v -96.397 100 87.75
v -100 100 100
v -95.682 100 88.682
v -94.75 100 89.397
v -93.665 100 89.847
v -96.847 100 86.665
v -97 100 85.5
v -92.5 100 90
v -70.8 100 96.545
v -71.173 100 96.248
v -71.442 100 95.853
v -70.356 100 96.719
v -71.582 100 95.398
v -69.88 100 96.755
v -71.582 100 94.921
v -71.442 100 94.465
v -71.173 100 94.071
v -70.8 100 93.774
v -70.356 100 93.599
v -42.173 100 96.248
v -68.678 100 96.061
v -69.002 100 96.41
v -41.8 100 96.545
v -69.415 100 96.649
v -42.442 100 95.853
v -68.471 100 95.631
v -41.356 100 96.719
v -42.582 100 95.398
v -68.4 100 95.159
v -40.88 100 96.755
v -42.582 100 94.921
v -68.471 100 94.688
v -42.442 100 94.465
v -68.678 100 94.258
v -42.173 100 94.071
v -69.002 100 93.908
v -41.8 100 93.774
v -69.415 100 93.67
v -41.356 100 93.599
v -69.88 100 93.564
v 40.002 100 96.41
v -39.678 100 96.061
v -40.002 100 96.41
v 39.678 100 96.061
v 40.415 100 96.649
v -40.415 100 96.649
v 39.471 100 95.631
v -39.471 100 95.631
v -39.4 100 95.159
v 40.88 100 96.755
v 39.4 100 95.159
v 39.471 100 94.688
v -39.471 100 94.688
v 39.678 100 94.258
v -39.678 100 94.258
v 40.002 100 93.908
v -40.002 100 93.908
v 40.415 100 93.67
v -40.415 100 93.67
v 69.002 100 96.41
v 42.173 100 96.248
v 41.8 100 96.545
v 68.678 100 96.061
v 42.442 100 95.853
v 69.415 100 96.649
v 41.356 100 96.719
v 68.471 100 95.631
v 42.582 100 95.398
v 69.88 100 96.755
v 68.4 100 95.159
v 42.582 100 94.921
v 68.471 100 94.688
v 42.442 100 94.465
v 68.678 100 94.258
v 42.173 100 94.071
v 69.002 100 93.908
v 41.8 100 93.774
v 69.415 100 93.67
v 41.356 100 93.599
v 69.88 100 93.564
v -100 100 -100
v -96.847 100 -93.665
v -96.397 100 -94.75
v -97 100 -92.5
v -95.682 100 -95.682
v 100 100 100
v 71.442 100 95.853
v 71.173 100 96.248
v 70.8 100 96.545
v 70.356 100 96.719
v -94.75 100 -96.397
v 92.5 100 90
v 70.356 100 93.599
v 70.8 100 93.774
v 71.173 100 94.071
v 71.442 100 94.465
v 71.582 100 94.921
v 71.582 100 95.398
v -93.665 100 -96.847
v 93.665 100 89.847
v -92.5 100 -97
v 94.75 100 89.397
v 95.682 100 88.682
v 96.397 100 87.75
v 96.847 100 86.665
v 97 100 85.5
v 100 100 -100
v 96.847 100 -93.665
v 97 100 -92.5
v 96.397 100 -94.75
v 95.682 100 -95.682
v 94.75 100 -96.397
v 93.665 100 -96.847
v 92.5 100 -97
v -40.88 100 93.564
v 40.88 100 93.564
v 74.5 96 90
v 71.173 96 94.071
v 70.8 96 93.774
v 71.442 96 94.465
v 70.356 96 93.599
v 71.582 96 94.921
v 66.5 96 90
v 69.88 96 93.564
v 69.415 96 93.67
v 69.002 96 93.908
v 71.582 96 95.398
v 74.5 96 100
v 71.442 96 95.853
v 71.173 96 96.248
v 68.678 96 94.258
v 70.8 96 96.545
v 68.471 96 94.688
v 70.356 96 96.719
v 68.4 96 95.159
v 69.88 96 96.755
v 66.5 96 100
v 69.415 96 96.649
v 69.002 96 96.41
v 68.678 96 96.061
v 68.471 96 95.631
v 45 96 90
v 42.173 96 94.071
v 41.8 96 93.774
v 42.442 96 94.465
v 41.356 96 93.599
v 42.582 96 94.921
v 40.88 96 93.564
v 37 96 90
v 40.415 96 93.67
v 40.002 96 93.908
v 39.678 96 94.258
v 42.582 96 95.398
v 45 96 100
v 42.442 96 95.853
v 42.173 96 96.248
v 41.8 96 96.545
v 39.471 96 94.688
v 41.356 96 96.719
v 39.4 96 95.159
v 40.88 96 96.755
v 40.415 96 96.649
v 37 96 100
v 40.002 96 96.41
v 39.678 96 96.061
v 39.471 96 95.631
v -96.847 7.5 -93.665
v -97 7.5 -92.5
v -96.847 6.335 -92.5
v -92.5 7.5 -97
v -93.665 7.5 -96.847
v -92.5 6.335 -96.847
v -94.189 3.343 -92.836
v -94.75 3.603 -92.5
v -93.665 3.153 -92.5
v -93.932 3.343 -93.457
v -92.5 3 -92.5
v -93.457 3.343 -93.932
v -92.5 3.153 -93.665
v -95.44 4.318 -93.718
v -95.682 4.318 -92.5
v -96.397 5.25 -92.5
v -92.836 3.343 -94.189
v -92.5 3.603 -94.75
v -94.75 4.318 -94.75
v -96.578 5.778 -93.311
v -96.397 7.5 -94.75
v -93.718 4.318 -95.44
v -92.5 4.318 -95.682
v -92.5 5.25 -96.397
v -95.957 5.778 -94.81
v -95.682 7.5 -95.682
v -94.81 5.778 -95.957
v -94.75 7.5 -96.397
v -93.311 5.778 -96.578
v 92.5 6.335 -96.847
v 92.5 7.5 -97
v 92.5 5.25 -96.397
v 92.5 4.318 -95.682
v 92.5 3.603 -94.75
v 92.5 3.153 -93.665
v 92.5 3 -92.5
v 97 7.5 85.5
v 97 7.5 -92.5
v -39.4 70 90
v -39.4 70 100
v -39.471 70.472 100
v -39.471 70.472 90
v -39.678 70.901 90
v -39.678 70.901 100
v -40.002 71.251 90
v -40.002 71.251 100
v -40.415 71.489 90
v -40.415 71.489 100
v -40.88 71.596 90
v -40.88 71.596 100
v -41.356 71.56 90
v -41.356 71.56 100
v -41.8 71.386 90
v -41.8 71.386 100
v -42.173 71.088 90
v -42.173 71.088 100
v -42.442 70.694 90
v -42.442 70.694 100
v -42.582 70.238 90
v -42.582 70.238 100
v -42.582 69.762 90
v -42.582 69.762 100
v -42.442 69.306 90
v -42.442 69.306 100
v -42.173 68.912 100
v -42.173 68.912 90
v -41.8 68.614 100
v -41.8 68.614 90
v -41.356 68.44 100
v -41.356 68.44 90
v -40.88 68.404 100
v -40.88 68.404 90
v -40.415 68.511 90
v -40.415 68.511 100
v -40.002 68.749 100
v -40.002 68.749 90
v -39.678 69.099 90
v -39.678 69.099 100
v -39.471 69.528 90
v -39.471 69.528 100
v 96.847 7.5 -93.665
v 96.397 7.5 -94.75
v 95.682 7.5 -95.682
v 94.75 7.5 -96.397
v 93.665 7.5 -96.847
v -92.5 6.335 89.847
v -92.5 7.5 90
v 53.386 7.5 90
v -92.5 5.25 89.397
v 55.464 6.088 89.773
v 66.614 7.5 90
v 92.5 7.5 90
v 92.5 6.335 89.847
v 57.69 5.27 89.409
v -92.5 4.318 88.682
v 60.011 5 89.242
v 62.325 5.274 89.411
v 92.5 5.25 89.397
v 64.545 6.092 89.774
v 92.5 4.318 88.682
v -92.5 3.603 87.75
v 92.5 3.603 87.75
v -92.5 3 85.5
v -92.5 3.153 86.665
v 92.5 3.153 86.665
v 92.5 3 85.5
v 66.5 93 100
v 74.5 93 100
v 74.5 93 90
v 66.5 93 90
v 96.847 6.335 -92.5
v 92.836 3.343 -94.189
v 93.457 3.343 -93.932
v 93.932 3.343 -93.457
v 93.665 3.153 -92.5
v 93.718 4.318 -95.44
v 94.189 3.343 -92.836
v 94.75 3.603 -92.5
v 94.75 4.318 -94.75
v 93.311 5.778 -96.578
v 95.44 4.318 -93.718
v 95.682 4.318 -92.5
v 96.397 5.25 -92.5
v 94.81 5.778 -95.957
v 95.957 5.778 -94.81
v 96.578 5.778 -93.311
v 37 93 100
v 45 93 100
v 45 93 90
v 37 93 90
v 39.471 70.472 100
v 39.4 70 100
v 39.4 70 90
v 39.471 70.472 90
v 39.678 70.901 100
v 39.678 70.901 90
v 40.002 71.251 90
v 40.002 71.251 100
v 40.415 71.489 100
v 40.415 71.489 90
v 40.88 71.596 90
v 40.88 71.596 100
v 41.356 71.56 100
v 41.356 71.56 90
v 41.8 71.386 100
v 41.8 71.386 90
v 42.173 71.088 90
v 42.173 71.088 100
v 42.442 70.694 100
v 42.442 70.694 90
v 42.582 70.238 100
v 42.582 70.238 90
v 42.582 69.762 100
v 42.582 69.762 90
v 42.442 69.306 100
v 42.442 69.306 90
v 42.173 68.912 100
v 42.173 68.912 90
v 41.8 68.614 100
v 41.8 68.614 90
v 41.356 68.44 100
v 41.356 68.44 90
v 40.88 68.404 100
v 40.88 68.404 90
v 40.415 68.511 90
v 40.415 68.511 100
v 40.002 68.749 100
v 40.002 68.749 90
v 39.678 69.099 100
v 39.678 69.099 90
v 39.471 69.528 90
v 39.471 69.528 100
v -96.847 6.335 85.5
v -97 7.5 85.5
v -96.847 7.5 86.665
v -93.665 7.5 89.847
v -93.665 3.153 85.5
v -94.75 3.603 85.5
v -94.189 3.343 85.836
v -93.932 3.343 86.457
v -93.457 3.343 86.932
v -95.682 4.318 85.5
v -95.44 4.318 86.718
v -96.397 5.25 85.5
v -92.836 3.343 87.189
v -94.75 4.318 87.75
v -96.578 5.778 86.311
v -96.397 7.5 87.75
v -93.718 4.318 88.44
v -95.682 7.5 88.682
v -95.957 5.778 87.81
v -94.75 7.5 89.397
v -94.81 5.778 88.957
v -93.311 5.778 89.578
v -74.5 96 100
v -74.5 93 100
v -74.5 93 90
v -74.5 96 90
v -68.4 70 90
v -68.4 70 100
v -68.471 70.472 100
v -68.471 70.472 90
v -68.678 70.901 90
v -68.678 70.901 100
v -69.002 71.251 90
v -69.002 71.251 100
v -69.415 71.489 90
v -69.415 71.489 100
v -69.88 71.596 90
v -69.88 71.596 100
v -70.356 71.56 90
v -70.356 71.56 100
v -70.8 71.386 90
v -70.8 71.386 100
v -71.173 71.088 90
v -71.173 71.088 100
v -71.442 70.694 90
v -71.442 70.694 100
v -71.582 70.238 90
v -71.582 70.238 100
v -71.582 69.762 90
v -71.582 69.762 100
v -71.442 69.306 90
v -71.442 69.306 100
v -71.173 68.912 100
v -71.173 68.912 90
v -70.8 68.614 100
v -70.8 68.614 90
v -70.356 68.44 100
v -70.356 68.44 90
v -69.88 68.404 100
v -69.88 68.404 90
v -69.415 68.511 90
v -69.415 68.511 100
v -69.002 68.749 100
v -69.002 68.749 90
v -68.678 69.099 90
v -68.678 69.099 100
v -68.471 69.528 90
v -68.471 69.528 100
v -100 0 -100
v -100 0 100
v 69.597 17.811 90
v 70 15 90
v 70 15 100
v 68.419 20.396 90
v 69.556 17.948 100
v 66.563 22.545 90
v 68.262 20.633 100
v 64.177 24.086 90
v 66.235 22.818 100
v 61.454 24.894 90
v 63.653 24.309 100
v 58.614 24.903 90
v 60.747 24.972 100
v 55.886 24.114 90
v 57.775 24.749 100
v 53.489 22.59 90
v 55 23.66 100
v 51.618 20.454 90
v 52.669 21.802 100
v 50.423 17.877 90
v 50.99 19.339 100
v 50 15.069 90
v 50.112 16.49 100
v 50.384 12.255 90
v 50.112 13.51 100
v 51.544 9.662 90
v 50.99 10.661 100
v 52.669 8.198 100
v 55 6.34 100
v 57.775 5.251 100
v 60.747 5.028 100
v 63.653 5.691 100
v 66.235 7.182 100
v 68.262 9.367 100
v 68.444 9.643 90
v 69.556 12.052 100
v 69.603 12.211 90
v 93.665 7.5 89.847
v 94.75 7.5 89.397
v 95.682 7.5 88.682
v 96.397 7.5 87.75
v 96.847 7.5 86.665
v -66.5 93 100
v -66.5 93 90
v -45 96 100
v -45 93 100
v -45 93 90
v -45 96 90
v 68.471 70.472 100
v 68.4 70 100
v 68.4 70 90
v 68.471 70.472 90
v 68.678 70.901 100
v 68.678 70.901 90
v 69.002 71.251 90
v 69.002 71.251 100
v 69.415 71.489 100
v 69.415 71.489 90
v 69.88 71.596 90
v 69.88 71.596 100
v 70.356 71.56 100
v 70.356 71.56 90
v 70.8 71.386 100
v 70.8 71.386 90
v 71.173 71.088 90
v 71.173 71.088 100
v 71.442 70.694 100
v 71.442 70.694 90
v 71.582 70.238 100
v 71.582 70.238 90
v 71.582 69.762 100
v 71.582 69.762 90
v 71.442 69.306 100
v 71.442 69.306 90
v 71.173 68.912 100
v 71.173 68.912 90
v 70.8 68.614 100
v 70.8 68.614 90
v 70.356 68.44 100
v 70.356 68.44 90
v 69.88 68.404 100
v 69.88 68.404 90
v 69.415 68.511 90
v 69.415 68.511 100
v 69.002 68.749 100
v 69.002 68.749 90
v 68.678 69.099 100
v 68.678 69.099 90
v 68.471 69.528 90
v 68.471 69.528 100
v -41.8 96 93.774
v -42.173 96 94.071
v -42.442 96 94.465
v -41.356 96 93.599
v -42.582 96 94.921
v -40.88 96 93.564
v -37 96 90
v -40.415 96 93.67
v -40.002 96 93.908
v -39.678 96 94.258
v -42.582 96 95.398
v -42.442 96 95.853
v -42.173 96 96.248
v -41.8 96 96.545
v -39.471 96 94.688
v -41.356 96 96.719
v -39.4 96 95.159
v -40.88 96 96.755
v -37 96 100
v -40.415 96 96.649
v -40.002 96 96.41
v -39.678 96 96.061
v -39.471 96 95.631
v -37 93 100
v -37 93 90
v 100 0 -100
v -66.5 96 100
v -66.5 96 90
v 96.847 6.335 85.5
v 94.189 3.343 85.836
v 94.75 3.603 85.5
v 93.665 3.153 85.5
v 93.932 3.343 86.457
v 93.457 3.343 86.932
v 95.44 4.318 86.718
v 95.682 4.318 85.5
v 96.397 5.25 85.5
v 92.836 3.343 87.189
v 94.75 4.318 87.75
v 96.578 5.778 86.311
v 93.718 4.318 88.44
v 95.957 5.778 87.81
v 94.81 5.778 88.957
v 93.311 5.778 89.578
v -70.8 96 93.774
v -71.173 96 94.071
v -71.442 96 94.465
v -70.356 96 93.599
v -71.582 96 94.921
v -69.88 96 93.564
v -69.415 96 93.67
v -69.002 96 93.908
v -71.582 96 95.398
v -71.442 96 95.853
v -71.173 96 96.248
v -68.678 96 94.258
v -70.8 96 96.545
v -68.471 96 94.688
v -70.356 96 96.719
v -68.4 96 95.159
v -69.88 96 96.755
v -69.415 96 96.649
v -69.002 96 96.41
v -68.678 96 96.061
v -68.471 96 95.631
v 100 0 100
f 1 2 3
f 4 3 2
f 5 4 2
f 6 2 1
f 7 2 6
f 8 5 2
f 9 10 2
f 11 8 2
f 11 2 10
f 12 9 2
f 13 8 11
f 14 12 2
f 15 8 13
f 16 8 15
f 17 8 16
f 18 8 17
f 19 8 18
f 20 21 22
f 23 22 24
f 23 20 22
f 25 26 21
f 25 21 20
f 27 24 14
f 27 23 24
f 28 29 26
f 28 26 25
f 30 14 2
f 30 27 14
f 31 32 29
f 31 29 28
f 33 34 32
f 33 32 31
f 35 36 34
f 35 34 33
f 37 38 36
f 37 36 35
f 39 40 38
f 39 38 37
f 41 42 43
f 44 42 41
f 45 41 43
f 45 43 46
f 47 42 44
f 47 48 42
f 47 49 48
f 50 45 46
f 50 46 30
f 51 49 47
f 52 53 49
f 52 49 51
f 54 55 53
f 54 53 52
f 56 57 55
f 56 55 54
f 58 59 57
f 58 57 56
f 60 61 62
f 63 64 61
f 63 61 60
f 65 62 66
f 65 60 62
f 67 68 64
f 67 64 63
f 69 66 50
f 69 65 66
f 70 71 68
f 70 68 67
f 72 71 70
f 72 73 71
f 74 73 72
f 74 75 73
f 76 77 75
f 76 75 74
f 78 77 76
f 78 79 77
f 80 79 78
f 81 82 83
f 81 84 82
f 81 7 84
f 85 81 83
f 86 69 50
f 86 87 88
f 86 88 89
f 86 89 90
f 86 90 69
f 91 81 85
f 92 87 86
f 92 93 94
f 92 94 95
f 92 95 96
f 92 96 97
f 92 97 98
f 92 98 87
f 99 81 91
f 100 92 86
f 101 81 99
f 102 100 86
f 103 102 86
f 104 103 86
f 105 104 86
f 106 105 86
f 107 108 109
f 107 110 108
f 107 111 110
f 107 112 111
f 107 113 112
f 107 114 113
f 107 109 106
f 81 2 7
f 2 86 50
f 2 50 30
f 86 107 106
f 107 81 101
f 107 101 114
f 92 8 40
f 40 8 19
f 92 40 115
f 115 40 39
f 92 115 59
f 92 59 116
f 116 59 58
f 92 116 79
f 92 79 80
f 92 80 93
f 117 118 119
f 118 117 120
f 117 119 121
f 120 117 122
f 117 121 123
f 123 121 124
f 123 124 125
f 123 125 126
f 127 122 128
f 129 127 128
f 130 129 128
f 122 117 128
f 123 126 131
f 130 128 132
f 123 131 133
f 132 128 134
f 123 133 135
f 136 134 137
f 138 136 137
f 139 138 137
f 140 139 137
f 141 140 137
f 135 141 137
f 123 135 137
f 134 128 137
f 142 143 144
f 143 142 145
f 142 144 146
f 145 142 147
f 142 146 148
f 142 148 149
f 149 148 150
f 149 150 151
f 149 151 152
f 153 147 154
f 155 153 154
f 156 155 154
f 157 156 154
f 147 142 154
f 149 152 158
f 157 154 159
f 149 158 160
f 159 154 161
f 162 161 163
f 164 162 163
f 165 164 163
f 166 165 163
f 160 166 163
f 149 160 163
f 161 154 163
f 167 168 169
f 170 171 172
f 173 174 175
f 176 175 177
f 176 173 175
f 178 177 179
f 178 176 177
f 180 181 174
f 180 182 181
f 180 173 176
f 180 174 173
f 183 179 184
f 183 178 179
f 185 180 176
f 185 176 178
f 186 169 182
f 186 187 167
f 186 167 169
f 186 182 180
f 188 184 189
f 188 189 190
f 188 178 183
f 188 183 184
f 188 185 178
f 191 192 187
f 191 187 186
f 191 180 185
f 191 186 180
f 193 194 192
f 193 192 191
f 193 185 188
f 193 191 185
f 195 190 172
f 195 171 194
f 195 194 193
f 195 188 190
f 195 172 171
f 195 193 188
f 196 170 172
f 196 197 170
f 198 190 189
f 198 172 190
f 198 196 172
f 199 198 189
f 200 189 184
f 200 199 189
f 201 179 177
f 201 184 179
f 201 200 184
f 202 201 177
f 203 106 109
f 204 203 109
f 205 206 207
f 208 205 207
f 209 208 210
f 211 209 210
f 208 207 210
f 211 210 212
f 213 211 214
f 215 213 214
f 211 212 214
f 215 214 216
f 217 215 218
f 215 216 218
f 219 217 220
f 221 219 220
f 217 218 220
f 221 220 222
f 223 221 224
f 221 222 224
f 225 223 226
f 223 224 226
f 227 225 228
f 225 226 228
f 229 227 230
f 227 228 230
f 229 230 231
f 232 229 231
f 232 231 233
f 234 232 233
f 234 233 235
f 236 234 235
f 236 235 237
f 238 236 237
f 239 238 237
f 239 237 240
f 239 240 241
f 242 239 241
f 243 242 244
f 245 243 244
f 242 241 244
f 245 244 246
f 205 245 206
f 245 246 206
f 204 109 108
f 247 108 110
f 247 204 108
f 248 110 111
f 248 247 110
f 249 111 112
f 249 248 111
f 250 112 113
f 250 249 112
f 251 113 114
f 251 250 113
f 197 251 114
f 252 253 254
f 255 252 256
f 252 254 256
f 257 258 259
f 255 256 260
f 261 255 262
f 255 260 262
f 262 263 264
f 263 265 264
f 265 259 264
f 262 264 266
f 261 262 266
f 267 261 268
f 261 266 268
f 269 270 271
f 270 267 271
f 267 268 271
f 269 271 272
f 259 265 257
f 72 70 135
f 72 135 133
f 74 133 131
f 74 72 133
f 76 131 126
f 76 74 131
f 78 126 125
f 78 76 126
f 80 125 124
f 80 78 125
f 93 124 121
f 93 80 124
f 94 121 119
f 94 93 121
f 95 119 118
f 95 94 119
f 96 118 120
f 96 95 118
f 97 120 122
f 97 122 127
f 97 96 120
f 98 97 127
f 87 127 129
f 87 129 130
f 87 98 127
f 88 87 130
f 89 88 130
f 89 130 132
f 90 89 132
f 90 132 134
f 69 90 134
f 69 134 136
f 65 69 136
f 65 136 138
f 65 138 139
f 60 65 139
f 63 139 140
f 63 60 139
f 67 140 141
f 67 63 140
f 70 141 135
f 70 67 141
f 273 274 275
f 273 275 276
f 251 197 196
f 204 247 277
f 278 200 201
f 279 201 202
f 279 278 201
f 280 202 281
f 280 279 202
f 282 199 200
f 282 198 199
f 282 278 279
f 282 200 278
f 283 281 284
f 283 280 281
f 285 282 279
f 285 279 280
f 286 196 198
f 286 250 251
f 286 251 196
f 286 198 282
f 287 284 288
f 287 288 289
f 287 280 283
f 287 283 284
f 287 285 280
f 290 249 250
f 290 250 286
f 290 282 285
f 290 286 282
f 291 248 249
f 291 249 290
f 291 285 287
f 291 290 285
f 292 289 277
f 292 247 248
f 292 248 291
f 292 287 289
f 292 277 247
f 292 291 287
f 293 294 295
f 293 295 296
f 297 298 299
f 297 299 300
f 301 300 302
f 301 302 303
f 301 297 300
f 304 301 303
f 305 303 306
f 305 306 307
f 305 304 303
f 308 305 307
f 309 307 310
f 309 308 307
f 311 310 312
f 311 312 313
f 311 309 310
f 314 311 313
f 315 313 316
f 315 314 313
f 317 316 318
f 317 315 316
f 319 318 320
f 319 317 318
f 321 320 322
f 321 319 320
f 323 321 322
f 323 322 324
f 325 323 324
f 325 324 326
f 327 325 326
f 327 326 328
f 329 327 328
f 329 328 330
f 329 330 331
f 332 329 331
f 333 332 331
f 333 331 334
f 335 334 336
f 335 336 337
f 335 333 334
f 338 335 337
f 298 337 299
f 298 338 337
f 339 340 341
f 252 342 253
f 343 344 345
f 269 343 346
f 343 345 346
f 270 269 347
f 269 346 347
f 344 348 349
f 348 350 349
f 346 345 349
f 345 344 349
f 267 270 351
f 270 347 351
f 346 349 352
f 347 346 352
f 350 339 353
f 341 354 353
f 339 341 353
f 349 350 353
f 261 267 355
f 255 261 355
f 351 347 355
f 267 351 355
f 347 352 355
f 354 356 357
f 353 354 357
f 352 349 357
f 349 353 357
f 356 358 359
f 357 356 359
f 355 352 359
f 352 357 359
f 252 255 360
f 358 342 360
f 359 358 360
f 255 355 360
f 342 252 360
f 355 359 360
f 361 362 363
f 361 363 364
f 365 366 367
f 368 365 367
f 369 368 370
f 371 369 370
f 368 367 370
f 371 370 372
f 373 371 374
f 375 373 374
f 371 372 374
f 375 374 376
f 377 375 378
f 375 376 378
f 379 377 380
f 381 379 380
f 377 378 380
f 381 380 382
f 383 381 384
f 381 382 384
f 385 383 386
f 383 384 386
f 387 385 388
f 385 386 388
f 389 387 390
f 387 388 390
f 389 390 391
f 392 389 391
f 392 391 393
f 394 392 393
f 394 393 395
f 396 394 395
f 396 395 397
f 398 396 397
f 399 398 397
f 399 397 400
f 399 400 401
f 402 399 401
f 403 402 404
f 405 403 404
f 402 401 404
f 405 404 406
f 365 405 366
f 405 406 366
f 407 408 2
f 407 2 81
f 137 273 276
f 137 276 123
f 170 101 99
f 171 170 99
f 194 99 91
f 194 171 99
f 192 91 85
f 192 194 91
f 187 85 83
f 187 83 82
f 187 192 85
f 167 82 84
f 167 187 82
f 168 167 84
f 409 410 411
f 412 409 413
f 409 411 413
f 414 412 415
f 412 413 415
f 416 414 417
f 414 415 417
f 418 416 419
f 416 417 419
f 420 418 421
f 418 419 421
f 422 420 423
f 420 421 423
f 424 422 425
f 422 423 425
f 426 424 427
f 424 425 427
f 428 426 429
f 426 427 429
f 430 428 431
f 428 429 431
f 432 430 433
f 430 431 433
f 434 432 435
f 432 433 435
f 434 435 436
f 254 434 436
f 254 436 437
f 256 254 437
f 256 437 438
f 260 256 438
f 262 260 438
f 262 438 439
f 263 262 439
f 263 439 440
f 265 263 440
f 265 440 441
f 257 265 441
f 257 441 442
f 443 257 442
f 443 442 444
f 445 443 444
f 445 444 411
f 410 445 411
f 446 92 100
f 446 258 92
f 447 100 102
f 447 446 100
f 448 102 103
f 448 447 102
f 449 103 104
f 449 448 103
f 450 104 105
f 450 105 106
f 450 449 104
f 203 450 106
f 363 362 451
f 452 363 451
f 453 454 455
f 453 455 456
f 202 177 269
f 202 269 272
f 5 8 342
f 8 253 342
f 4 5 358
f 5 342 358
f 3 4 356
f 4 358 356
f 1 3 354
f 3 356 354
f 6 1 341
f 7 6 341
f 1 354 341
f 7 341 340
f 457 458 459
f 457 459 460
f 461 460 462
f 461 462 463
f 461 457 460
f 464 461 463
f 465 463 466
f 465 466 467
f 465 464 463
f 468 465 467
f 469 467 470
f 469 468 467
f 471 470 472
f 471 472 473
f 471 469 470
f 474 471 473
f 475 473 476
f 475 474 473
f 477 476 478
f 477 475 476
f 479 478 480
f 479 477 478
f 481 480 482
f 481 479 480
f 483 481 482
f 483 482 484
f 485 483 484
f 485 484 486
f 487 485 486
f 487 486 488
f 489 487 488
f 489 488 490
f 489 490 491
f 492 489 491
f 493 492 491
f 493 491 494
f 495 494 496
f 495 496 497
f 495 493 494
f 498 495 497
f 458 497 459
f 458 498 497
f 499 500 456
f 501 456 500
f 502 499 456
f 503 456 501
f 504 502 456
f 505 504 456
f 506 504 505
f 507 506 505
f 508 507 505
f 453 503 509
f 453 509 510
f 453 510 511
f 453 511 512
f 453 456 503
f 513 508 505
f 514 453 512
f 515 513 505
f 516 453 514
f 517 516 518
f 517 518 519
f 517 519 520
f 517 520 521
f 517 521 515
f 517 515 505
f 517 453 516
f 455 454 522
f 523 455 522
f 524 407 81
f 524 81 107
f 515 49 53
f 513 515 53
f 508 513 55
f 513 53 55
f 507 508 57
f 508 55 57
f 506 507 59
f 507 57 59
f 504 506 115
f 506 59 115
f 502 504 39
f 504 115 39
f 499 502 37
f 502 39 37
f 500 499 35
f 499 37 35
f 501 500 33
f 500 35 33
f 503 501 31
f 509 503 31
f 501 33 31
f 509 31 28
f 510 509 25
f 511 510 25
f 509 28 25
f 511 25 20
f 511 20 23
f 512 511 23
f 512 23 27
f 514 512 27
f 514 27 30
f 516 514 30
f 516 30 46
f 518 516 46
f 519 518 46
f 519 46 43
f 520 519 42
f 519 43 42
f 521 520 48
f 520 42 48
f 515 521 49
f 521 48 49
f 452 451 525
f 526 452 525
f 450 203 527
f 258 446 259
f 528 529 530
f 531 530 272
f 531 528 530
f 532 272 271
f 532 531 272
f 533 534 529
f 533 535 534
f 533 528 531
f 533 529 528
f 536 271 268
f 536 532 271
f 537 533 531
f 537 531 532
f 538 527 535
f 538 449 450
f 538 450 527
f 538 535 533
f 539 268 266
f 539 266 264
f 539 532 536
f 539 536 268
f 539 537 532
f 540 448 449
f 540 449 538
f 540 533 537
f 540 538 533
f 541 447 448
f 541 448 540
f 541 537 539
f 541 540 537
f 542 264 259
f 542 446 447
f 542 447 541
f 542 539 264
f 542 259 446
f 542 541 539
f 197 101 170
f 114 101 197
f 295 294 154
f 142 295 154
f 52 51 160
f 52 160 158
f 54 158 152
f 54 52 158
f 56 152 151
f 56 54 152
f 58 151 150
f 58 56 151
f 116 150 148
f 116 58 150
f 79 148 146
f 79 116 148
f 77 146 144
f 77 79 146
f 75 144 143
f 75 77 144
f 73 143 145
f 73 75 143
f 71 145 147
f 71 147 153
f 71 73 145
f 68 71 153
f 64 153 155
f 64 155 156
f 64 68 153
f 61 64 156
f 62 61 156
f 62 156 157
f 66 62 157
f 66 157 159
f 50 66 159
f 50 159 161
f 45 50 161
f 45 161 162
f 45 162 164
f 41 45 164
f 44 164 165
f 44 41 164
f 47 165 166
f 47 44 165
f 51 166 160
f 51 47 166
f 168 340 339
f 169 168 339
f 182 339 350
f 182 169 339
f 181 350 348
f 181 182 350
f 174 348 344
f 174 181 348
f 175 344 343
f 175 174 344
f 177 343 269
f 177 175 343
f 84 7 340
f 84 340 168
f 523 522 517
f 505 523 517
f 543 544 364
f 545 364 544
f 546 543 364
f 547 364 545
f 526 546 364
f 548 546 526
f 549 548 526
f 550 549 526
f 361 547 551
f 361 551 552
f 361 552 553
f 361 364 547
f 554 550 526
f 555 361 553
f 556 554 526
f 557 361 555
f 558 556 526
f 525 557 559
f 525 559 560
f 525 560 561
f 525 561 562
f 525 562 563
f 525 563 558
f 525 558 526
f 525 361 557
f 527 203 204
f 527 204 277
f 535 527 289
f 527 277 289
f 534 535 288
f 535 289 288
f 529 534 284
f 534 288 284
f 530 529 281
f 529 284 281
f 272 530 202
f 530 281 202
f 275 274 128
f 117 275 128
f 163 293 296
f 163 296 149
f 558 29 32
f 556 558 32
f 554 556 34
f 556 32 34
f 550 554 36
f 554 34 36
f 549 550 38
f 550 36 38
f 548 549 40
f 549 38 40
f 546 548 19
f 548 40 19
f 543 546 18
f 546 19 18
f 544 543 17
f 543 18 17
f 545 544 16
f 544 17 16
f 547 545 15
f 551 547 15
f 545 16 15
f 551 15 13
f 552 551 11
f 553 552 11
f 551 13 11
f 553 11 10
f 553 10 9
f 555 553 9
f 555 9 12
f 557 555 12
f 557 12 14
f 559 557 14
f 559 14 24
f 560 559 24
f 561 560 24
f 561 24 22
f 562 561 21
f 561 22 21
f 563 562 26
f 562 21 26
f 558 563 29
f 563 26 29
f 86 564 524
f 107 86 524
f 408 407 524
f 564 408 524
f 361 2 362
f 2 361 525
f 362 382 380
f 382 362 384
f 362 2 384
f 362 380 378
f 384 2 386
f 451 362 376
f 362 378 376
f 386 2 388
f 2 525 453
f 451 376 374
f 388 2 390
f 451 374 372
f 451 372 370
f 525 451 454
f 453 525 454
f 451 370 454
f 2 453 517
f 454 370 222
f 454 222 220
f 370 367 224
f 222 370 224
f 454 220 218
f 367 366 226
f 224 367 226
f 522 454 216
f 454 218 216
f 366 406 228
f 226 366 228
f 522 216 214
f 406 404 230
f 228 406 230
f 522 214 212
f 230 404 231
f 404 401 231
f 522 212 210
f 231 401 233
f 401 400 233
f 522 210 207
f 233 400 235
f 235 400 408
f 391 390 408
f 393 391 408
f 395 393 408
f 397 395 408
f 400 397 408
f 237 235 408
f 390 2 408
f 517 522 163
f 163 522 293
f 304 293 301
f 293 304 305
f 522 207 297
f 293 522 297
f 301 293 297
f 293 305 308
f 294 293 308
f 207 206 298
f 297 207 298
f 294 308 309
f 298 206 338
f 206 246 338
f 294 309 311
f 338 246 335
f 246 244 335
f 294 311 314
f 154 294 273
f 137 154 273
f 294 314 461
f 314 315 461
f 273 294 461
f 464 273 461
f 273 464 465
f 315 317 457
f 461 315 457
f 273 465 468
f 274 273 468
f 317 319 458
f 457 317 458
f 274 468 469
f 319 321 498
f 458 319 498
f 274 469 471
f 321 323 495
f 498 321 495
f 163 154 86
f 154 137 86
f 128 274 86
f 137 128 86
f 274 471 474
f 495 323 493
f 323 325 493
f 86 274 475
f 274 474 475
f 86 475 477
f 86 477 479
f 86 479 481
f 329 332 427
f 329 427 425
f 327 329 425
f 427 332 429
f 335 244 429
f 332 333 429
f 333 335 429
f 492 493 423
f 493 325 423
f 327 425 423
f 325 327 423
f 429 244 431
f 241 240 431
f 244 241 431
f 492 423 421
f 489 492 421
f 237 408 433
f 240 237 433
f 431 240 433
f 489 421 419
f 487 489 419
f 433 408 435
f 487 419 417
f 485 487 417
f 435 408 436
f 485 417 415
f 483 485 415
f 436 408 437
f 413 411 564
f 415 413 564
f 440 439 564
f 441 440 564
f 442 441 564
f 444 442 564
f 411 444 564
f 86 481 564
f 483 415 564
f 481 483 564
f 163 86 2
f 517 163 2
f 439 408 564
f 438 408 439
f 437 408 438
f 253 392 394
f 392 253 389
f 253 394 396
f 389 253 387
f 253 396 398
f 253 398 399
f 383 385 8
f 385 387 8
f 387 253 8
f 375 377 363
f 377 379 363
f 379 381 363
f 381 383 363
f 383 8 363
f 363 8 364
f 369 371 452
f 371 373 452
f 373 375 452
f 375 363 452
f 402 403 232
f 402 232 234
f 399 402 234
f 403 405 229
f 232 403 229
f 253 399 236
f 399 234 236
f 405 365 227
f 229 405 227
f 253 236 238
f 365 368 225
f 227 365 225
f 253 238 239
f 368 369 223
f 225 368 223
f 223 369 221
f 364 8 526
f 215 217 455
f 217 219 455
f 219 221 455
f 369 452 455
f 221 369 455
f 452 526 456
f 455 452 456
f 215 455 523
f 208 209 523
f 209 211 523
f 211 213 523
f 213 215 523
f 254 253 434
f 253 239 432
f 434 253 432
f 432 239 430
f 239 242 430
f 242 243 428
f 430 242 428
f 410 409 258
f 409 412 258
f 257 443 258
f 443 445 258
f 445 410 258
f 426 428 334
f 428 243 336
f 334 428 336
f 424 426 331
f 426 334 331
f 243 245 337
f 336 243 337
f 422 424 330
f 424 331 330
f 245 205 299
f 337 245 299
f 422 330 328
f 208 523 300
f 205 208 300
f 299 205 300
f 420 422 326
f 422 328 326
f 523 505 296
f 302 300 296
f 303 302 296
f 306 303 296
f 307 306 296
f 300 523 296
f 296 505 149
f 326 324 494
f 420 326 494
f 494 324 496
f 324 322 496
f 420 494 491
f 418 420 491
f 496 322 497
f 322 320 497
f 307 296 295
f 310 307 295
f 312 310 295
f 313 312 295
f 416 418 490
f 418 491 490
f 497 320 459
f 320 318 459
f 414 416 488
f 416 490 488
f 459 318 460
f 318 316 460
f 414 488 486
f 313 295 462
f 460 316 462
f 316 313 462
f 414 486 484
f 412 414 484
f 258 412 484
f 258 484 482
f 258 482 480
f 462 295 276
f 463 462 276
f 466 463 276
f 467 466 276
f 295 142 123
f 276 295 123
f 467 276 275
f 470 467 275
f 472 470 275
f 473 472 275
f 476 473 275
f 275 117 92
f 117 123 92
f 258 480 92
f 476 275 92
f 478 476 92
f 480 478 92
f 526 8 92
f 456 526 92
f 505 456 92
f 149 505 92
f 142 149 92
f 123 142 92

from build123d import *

# Parameters (mm, degrees)
CROQUIS1_W              = 200
CROQUIS1_H              = 200
SALIENTE_EXTRUIR1_DEPTH = 100
CROQUIS2_W              = 194
CROQUIS2_H              = 187
CORTAR_EXTRUIR1_DEPTH   = 97
REDONDEO2_R             = 4.5
CROQUIS3_R              = 1.6
CROQUIS3_W              = 8
CROQUIS3_H              = 3
CORTAR_EXTRUIR2_DEPTH   = 10
CORTAR_EXTRUIR3_REACH   = 202
CROQUIS4_R              = 10
CROQUIS5_R              = 1.6
CORTAR_EXTRUIR4_DEPTH   = 4


with BuildPart() as part:
    # Croquis1 → Saliente-Extruir1 (new body)
    with BuildSketch(Plane(origin=(0, 0, 0), x_dir=(1, 0, 0), z_dir=(0, 1, 0))):
        Rectangle(CROQUIS1_W, CROQUIS1_H)
    extrude(amount=SALIENTE_EXTRUIR1_DEPTH)

    # Croquis2 → Cortar-Extruir1 (cut)
    with BuildSketch(Plane(origin=(0, 100, 0), x_dir=(1, 0, 0), z_dir=(0, 1, 0))):
        with Locations((0, 3.5)):
            Rectangle(CROQUIS2_W, CROQUIS2_H)
    extrude(amount=-CORTAR_EXTRUIR1_DEPTH, mode=Mode.SUBTRACT)

    # Redondeo2
    redondeo2_edges = [part.edges().sort_by_distance(p)[0] for p in [
        (-97, 51.5, 90),
        (-97, 51.5, -97),
        (97, 51.5, -97),
        (97, 51.5, 90),
        (-97, 3, -3.5),
        (0, 3, -97),
        (97, 3, -3.5),
        (0, 3, 90),
    ]]
    fillet(redondeo2_edges, radius=REDONDEO2_R)

    # Croquis3 → Cortar-Extruir2 (cut)
    with BuildSketch(Plane.XY.offset(100)):
        with Locations((-70, 70)):
            Circle(CROQUIS3_R)
        with Locations((-41, 70)):
            Circle(CROQUIS3_R)
        with Locations((-70.5, 94.5)):
            Rectangle(CROQUIS3_W, CROQUIS3_H)
        with Locations((-41, 94.5)):
            Rectangle(CROQUIS3_W, CROQUIS3_H)
    cortar_extruir2 = extrude(amount=-CORTAR_EXTRUIR2_DEPTH, mode=Mode.SUBTRACT)

    # Simetría1: Cortar-Extruir2 across plane
    add(cortar_extruir2.mirror(Plane(origin=(0, 0, 0), x_dir=(0, 0, 1), z_dir=(1, 0, 0))), mode=Mode.SUBTRACT)

    # Croquis4 → Cortar-Extruir3 (cut, up to next)
    with BuildSketch(Plane.XY.offset(100), mode=Mode.PRIVATE) as cortar_extruir3_sk1:
        with Locations((60, 15)):
            Circle(CROQUIS4_R)
    cortar_extruir3_tool1 = extrude(cortar_extruir3_sk1.sketch, amount=-CORTAR_EXTRUIR3_REACH, mode=Mode.PRIVATE) & part.part
    add(cortar_extruir3_tool1.solids().sort_by_distance((60, 15, 100))[0], mode=Mode.SUBTRACT)

    # Croquis5 → Cortar-Extruir4 (cut)
    with BuildSketch(Plane(origin=(0, 100, 0), x_dir=(1, 0, 0), z_dir=(0, 1, 0))):
        with Locations((-70, -95.159266914)):
            Circle(CROQUIS5_R)
        with Locations((-41, -95.159266914)):
            Circle(CROQUIS5_R)
    cortar_extruir4 = extrude(amount=-CORTAR_EXTRUIR4_DEPTH, mode=Mode.SUBTRACT)

    # Simetría2: Cortar-Extruir4 across plane
    add(cortar_extruir4.mirror(Plane(origin=(0, 0, 0), x_dir=(0, 0, 1), z_dir=(1, 0, 0))), mode=Mode.SUBTRACT)


solid = part.part
